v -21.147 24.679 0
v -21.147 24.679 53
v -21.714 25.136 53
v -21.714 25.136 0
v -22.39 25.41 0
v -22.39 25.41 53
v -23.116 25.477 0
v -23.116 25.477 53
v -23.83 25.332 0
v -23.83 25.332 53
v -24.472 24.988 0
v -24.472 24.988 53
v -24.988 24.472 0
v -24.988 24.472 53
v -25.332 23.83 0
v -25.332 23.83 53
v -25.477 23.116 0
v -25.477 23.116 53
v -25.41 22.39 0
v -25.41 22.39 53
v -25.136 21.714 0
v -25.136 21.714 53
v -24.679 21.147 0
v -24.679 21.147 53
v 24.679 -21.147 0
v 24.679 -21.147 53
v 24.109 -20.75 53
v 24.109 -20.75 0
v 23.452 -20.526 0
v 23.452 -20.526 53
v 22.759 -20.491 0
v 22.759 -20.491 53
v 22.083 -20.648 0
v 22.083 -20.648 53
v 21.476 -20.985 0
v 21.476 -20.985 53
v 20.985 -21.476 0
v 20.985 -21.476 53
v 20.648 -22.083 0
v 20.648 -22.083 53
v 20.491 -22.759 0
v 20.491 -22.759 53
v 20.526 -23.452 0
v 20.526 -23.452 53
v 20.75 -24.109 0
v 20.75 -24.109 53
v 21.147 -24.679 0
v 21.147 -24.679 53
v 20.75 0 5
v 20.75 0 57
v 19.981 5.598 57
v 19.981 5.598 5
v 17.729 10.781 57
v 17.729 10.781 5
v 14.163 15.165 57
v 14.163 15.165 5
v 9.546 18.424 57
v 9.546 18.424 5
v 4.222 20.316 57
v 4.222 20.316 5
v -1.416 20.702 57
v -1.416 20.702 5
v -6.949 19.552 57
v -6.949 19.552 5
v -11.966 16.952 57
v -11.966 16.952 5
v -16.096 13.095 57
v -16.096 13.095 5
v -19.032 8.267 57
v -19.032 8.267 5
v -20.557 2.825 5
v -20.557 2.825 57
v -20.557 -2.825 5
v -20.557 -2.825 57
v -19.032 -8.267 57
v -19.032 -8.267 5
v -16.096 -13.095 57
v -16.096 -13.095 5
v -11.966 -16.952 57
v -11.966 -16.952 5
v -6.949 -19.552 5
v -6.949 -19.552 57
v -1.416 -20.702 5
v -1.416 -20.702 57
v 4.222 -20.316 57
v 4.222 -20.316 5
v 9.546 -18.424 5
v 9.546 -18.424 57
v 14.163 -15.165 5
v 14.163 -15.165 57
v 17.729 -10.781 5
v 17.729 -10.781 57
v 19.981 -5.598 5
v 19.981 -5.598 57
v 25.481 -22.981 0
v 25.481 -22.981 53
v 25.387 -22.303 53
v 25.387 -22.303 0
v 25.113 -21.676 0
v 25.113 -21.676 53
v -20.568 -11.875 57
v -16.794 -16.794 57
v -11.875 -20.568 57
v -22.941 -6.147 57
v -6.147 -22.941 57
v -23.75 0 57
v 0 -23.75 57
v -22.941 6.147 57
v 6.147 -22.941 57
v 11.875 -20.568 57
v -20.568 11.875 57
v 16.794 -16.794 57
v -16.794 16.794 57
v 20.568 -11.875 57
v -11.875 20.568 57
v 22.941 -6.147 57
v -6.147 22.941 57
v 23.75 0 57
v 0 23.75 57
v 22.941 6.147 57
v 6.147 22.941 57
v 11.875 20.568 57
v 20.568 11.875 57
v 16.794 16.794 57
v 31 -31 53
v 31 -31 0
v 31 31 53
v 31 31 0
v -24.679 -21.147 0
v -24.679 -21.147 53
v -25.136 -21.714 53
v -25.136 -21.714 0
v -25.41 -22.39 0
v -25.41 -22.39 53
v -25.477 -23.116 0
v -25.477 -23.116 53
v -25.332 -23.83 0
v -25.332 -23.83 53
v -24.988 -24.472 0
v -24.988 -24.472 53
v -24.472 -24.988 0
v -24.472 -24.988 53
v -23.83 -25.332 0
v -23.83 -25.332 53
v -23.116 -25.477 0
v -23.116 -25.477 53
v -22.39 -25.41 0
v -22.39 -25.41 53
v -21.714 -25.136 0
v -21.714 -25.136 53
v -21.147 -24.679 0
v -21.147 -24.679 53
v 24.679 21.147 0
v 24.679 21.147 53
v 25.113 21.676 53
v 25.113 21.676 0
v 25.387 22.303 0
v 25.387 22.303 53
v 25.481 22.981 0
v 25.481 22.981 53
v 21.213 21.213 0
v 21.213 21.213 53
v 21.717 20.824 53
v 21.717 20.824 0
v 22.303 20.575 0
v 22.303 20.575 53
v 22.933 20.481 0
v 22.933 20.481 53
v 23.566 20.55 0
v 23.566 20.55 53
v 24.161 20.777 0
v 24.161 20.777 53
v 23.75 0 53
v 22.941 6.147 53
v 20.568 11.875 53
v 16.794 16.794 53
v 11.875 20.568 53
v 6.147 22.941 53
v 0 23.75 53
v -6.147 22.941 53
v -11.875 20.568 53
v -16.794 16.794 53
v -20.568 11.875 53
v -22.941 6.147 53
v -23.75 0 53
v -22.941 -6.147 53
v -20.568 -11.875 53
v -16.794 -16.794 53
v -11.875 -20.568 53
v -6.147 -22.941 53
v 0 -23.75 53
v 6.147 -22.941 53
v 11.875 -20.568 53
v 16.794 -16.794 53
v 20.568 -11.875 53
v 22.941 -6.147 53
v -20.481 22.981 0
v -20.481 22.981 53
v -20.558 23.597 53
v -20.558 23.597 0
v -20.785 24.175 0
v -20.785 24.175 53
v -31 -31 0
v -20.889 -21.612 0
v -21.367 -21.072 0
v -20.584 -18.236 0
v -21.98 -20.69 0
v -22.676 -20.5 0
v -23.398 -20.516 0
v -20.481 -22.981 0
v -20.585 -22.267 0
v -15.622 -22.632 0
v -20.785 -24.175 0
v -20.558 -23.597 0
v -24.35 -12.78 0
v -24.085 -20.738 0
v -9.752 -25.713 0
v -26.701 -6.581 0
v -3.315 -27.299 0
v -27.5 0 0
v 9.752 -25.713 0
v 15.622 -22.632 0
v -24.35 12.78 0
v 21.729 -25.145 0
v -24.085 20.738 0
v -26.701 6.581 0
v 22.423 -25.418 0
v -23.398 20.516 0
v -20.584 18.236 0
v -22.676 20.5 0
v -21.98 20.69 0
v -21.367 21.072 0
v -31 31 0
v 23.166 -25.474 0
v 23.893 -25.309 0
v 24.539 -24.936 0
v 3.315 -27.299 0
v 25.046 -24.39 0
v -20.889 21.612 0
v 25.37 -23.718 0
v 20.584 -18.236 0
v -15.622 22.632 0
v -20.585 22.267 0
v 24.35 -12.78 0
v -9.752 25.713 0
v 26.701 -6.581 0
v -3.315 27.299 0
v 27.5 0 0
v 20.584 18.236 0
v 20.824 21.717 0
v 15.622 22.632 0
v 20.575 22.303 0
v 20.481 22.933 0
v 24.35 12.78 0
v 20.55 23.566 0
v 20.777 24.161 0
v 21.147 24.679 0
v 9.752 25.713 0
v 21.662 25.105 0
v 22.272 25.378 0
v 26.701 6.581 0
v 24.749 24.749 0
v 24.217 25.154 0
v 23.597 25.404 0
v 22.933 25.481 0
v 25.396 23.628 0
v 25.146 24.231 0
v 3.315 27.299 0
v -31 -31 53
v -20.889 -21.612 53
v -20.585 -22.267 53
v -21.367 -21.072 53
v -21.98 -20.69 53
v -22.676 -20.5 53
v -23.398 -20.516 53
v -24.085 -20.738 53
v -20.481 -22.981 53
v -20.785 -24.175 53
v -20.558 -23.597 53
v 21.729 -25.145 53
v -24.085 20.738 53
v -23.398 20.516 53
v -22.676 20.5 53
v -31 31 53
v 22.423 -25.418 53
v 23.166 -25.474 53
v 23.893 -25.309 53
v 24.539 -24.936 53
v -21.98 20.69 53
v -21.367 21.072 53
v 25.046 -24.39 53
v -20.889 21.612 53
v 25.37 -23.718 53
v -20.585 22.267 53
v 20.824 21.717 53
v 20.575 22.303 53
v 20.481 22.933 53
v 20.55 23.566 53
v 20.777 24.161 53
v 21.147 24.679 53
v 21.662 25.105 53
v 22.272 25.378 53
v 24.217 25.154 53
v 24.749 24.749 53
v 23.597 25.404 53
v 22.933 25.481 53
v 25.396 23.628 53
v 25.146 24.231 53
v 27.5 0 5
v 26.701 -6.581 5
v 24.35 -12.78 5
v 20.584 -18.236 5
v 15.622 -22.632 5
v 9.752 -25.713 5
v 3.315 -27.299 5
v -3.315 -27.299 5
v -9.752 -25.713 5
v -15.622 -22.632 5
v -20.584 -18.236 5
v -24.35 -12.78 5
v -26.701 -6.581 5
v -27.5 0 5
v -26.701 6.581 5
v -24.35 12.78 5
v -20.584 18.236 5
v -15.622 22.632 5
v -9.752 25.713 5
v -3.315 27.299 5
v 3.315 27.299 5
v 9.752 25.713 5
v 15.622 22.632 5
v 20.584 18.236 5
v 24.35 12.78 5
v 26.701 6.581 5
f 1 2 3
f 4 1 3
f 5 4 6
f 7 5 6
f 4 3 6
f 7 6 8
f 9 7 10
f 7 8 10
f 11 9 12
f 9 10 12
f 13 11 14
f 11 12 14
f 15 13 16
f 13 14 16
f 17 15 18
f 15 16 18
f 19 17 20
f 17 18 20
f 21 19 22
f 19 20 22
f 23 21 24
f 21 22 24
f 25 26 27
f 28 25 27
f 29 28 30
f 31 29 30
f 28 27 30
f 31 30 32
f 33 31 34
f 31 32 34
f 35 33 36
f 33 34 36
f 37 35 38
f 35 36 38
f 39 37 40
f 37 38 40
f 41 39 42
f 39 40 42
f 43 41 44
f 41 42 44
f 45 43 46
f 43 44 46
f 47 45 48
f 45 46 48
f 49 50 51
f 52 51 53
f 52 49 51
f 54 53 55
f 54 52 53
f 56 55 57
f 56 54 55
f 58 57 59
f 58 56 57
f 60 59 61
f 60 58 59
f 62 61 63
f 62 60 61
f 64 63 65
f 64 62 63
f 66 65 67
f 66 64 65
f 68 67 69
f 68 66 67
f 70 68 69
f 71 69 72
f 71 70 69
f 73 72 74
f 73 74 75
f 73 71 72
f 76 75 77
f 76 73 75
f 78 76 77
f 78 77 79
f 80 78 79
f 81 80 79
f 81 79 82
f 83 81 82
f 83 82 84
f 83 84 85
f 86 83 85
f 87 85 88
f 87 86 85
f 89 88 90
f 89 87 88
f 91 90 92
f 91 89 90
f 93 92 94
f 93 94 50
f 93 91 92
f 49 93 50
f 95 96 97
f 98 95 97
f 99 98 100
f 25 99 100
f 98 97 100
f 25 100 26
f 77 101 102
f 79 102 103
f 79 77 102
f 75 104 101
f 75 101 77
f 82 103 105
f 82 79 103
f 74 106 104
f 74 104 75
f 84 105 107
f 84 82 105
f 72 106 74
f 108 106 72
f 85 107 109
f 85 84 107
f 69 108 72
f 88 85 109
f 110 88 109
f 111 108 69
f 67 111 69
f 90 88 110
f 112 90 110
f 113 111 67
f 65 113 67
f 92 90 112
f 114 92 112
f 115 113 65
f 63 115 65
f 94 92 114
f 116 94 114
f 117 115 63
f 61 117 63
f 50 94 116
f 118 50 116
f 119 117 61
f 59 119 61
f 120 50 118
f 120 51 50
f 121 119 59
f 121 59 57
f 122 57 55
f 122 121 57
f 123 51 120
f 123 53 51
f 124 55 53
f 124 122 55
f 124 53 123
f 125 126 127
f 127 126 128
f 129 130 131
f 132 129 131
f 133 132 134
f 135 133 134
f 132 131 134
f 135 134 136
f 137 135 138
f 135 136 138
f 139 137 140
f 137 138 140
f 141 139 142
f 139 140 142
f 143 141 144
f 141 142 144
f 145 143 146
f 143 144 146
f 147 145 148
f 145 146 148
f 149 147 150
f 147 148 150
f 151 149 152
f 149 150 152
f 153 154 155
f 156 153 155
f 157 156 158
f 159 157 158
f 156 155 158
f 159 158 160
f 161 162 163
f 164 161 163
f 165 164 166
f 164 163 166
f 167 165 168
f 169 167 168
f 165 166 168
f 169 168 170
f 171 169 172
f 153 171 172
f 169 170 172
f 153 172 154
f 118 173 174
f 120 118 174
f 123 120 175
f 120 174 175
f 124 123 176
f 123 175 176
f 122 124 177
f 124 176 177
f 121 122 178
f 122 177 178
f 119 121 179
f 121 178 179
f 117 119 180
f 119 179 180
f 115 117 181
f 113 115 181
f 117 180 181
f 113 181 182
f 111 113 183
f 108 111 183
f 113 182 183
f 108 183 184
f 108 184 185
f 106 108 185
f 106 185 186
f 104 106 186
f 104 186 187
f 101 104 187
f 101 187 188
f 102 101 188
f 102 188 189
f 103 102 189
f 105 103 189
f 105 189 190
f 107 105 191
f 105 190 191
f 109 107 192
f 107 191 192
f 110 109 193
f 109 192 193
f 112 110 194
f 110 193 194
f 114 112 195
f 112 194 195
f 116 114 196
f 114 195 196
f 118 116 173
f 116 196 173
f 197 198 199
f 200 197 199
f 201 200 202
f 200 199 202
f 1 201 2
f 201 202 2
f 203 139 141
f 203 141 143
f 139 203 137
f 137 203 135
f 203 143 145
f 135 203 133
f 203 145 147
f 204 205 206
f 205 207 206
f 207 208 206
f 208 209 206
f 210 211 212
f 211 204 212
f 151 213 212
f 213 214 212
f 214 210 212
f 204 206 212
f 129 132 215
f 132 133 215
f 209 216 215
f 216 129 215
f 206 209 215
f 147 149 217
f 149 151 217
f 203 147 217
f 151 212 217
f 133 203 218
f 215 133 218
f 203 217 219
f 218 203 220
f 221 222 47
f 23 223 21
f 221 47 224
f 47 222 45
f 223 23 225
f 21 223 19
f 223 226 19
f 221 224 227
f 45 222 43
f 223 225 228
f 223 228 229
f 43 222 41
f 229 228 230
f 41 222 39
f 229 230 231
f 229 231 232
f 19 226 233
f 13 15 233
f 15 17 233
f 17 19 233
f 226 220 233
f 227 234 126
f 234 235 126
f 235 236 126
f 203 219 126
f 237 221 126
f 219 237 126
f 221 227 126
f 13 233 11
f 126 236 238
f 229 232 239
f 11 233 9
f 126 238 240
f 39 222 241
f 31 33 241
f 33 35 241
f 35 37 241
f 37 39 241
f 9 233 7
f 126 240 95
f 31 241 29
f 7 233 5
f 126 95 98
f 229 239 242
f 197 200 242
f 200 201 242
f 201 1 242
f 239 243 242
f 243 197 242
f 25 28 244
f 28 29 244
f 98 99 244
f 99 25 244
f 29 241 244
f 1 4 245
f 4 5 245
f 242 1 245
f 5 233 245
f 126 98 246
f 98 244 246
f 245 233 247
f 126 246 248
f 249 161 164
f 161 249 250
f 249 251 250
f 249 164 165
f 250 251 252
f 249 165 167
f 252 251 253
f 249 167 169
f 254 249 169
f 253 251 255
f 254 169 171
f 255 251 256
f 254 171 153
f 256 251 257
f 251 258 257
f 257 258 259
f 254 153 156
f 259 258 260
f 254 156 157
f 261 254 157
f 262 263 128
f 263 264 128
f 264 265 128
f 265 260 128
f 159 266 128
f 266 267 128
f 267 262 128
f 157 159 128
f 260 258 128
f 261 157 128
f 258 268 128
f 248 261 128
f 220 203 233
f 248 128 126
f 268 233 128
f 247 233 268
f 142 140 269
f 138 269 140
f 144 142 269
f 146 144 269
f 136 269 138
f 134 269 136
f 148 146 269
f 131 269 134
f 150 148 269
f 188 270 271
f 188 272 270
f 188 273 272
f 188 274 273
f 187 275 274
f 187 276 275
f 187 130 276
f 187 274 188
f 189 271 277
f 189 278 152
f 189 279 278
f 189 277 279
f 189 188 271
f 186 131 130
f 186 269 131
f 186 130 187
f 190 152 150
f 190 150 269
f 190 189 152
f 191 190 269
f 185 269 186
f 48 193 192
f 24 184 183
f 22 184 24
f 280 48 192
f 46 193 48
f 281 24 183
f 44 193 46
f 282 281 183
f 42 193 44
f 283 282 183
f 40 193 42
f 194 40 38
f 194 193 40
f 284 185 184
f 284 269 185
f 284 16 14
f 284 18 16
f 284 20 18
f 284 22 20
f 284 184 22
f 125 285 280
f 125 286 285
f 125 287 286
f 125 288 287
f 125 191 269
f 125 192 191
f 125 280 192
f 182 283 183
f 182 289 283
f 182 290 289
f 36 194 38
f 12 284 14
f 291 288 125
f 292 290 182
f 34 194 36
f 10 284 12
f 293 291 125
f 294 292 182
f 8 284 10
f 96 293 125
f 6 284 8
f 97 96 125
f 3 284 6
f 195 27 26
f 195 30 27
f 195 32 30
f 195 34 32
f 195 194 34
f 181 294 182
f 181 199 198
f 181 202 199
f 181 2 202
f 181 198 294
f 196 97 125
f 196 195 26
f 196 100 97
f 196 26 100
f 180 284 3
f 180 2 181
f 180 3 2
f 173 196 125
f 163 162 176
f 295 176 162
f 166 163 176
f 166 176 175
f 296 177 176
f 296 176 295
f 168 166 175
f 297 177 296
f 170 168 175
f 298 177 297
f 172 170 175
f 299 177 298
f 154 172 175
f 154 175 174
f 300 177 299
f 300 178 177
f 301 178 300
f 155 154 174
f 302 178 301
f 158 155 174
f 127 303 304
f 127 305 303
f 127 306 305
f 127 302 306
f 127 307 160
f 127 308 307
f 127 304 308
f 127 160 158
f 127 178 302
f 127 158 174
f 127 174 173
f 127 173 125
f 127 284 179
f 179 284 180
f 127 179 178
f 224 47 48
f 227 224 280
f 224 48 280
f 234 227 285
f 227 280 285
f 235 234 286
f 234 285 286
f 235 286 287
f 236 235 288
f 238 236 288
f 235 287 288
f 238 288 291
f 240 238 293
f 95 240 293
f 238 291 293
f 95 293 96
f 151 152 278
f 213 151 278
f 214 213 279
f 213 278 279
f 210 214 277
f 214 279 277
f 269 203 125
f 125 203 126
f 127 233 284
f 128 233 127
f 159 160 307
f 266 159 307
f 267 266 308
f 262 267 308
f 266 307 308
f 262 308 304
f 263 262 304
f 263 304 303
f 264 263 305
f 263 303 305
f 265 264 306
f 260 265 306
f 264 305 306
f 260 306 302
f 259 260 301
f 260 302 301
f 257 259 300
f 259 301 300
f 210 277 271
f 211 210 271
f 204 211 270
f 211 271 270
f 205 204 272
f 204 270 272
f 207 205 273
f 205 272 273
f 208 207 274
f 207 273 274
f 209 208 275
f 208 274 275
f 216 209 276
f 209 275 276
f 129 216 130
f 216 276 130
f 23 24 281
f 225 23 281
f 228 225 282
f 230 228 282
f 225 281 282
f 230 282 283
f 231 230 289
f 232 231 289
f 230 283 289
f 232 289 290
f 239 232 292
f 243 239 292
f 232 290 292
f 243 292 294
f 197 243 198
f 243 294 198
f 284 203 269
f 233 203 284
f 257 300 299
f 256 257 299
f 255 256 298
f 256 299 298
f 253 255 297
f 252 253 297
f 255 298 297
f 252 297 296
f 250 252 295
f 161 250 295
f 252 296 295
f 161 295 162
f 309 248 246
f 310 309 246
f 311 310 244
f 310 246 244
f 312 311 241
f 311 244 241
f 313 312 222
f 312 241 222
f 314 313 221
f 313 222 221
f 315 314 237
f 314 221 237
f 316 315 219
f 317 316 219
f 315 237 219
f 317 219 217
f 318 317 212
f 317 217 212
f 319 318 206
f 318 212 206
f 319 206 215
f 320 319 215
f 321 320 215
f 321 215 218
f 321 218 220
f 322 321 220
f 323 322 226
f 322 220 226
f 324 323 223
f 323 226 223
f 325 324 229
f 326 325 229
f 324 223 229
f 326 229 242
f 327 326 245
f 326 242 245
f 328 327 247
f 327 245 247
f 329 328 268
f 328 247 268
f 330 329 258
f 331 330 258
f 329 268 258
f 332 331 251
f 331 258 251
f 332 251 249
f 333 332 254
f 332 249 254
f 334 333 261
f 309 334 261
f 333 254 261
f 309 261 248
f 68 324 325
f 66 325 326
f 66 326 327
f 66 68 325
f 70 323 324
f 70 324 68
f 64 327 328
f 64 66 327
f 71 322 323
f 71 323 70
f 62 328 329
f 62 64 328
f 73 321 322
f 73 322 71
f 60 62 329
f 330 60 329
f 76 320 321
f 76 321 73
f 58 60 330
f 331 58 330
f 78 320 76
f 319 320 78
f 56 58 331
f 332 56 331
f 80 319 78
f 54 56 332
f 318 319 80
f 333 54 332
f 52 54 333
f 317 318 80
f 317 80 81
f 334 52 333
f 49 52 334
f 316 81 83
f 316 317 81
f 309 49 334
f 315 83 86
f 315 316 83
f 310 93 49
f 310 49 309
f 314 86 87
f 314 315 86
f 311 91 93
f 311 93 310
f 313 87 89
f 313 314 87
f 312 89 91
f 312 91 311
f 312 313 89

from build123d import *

# Parameters (mm, degrees)
F0_W     = 62
F0_H     = 62
F0_R     = 20.75
F1_DEPTH = 53
F2_R     = 23.75
F2_R_2   = 20.75
F3_DEPTH = 4
F4_R     = 27.5
F4_R_2   = 20.75
F5_DEPTH = 5
F7_DEPTH = 53.001


with BuildPart() as f1:
    # F0 (on Top) → F1 (new body)
    with BuildSketch(Plane.XY):
        Rectangle(F0_W, F0_H)
        Circle(F0_R, mode=Mode.SUBTRACT)
    extrude(amount=F1_DEPTH)

    # F2 (on face) → F3 (join)
    with BuildSketch(Plane.XY.offset(53)):
        Circle(F2_R)
        Circle(F2_R_2, mode=Mode.SUBTRACT)
    extrude(amount=F3_DEPTH)

    # F4 (on face) → F5 (cut)
    with BuildSketch(Plane(origin=(0, 0, 0), x_dir=(1, 0, 0), z_dir=(0, 0, -1))):
        Circle(F4_R)
        Circle(F4_R_2, mode=Mode.SUBTRACT)
    extrude(amount=-F5_DEPTH, mode=Mode.SUBTRACT)

    # F6 (on face) → F7 (cut, through all)
    with BuildSketch(Plane.XY.offset(53)):
        with BuildLine():
            ThreePointArc((-24.679438301, 21.1465204028), (-22.9809703886, 22.9809703886), (-21.1465204028, 24.679438301))
            ThreePointArc((-21.1465204028, 24.679438301), (-24.7487373415, 24.7487373415), (-24.679438301, 21.1465204028))
        make_face()
        with BuildLine():
            ThreePointArc((-20.4809703886, 22.9809703886), (-20.653297198, 23.8930764777), (-21.1465204028, 24.679438301))
            ThreePointArc((-21.1465204028, 24.679438301), (-22.9809703886, 22.9809703886), (-24.679438301, 21.1465204028))
            ThreePointArc((-24.679438301, 21.1465204028), (-21.9800132919, 20.6901004903), (-20.4809703886, 22.9809703886))
        make_face()
        with BuildLine():
            ThreePointArc((21.1465204028, 24.679438301), (22.0800828621, 23.8478498151), (22.9809703886, 22.9809703886))
            Line((22.9809703886, 22.9809703886), (24.7487373415, 24.7487373415))
            ThreePointArc((24.7487373415, 24.7487373415), (22.9328845698, 25.4805078966), (21.1465204028, 24.679438301))
        make_face()
        with BuildLine():
            ThreePointArc((22.9809703886, 22.9809703886), (23.8478498151, 22.0800828621), (24.679438301, 21.1465204028))
            ThreePointArc((24.679438301, 21.1465204028), (25.2718402868, 21.9800132919), (25.4809703886, 22.9809703886))
            ThreePointArc((25.4809703886, 22.9809703886), (25.2906692198, 23.9376789695), (24.7487373415, 24.7487373415))
            Line((24.7487373415, 24.7487373415), (22.9809703886, 22.9809703886))
        make_face()
        with BuildLine():
            ThreePointArc((21.2132034356, 21.2132034356), (22.9328845698, 20.4814328805), (24.679438301, 21.1465204028))
            ThreePointArc((24.679438301, 21.1465204028), (23.8478498151, 22.0800828621), (22.9809703886, 22.9809703886))
            Line((22.9809703886, 22.9809703886), (21.2132034356, 21.2132034356))
        make_face()
        with BuildLine():
            Line((21.2132034356, 21.2132034356), (22.9809703886, 22.9809703886))
            ThreePointArc((22.9809703886, 22.9809703886), (22.0800828621, 23.8478498151), (21.1465204028, 24.679438301))
            ThreePointArc((21.1465204028, 24.679438301), (20.4814328805, 22.9328845698), (21.2132034356, 21.2132034356))
        make_face()
        with BuildLine():
            ThreePointArc((21.1465204028, -24.679438301), (22.9809703886, -22.9809703886), (24.679438301, -21.1465204028))
            ThreePointArc((24.679438301, -21.1465204028), (21.2132034356, -21.2132034356), (21.1465204028, -24.679438301))
        make_face()
        with BuildLine():
            ThreePointArc((25.4809703886, -22.9809703886), (25.2718402868, -21.9800132919), (24.679438301, -21.1465204028))
            ThreePointArc((24.679438301, -21.1465204028), (22.9809703886, -22.9809703886), (21.1465204028, -24.679438301))
            ThreePointArc((21.1465204028, -24.679438301), (23.8930764777, -25.3086435792), (25.4809703886, -22.9809703886))
        make_face()
        with BuildLine():
            ThreePointArc((-24.679438301, -21.1465204028), (-24.7487373415, -24.7487373415), (-21.1465204028, -24.679438301))
            ThreePointArc((-21.1465204028, -24.679438301), (-22.9809703886, -22.9809703886), (-24.679438301, -21.1465204028))
        make_face()
        with BuildLine():
            ThreePointArc((-24.679438301, -21.1465204028), (-22.9809703886, -22.9809703886), (-21.1465204028, -24.679438301))
            ThreePointArc((-21.1465204028, -24.679438301), (-20.653297198, -23.8930764777), (-20.4809703886, -22.9809703886))
            ThreePointArc((-20.4809703886, -22.9809703886), (-21.9800132919, -20.6901004903), (-24.679438301, -21.1465204028))
        make_face()
    extrude(amount=-F7_DEPTH, mode=Mode.SUBTRACT)


solid = f1.part
